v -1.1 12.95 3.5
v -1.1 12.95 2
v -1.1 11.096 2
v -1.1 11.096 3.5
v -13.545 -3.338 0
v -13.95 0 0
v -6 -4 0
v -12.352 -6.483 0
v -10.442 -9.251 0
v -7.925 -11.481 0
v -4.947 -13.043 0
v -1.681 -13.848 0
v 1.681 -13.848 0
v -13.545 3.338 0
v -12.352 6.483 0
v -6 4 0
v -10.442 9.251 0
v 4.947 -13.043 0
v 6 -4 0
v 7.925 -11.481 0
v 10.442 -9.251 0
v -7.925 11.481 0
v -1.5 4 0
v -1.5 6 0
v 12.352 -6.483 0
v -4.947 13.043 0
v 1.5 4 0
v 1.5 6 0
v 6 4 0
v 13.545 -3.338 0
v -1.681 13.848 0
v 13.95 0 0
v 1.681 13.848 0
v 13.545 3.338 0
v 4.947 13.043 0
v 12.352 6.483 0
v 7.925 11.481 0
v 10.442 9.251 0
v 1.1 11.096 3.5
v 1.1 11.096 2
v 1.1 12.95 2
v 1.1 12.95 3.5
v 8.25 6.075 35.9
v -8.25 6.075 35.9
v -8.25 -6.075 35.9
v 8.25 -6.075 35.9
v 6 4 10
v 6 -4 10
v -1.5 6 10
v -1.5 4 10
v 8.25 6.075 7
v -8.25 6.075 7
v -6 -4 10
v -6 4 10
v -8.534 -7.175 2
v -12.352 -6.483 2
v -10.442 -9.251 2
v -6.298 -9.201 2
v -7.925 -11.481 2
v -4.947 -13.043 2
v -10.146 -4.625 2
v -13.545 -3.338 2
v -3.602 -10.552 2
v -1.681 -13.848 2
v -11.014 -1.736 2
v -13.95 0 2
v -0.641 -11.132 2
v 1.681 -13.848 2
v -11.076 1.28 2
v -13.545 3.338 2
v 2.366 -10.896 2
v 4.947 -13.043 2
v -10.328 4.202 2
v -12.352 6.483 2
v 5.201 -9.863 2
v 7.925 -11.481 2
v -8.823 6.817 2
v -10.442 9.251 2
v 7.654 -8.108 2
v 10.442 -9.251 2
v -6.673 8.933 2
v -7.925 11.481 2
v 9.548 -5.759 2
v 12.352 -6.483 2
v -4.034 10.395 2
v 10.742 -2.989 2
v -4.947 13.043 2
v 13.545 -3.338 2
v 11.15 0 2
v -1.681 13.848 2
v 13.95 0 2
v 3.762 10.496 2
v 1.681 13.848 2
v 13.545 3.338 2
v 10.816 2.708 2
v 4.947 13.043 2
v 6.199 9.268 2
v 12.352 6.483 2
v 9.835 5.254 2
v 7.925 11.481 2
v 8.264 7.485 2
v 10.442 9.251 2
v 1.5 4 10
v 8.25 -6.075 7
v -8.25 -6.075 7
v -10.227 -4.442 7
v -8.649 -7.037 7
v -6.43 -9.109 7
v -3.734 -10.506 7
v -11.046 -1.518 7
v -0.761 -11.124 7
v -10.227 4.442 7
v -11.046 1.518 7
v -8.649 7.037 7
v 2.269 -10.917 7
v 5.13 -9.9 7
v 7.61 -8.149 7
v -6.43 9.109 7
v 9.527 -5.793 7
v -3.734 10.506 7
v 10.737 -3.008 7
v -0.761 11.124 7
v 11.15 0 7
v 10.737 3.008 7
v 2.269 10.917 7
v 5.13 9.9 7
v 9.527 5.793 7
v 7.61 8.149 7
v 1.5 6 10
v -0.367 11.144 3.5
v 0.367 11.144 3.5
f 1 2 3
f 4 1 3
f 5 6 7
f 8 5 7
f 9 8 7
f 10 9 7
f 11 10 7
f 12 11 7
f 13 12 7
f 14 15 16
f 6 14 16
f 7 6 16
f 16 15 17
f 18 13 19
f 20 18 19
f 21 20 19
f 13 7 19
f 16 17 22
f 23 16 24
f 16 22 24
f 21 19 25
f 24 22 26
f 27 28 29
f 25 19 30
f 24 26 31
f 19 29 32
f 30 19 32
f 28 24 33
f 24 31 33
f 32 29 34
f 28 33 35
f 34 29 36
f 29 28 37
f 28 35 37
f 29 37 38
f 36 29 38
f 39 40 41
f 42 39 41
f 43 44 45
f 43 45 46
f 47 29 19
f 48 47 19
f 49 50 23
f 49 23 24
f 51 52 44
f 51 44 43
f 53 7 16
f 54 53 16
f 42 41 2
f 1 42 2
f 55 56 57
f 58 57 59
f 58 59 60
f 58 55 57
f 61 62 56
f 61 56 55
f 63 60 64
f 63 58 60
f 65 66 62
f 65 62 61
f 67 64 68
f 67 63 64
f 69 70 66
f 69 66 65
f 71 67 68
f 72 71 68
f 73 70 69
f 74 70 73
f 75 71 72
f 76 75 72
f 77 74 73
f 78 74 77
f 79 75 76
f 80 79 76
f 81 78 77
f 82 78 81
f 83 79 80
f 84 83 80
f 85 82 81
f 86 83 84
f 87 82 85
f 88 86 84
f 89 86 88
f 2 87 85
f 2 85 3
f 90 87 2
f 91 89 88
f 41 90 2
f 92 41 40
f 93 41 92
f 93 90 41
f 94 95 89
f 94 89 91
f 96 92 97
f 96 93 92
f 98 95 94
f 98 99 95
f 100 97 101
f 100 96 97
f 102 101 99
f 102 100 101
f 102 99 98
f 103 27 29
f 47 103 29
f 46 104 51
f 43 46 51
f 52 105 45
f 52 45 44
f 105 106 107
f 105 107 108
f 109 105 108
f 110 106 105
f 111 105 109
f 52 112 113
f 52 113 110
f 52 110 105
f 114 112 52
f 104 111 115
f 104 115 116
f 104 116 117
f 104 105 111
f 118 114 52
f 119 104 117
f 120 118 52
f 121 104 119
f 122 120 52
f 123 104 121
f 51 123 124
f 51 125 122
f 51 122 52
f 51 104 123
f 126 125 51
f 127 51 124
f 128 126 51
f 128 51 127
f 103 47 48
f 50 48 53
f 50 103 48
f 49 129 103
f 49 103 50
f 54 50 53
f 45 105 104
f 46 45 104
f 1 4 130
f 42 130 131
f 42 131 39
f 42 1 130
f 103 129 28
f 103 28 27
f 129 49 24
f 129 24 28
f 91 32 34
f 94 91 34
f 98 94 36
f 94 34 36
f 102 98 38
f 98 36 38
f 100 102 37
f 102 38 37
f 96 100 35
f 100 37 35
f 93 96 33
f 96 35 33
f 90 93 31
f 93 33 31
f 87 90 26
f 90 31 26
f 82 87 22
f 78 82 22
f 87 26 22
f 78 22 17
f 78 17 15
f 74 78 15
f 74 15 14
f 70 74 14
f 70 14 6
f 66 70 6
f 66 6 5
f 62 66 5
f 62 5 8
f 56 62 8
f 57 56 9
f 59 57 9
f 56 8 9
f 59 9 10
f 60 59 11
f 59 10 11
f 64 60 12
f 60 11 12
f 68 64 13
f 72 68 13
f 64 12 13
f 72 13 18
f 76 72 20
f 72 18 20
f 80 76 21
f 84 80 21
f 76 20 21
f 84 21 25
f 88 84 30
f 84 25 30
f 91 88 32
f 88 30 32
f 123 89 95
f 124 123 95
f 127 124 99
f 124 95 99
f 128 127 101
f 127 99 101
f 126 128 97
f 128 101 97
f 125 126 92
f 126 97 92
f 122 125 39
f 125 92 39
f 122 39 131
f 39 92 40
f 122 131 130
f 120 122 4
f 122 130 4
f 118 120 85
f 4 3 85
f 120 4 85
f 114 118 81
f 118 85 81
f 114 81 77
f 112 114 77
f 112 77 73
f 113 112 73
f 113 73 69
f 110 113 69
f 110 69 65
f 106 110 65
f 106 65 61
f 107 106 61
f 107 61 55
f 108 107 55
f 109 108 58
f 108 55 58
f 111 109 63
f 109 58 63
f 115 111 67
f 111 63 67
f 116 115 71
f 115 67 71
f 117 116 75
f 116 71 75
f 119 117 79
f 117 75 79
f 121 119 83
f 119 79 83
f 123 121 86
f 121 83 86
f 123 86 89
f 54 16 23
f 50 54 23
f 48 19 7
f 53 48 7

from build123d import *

# Parameters (mm, degrees)
ESQUISSE1_R             = 13.95
BOSS_EXTRU_1_DEPTH      = 2
ESQUISSE2_R             = 11.15
BOSS_EXTRU_2_DEPTH      = 5
BOSS_EXTRU_3_DEPTH      = 1.5
ESQUISSE4_W             = 16.5
ESQUISSE4_H             = 12.15
BOSS_EXTRU_4_DEPTH      = 28.9
ENL_V_MAT_EXTRU_1_DEPTH = 10


with BuildPart() as part:
    # Esquisse1 → Boss.-Extru.1 (new body)
    with BuildSketch(Plane.XY):
        Circle(ESQUISSE1_R)
    extrude(amount=BOSS_EXTRU_1_DEPTH)

    # Esquisse2 → Boss.-Extru.2 (add)
    with BuildSketch(Plane.XY.offset(2)):
        Circle(ESQUISSE2_R)
    extrude(amount=BOSS_EXTRU_2_DEPTH)

    # Esquisse3 → Boss.-Extru.3 (add)
    with BuildSketch(Plane.XY.offset(2)):
        with BuildLine():
            ThreePointArc((-1.1, 11.095607239), (0, 11.15), (1.1, 11.095607239))
            Line((1.1, 11.095607239), (1.1, 12.95))
            Line((1.1, 12.95), (-1.1, 12.95))
            Line((-1.1, 12.95), (-1.1, 11.095607239))
        make_face()
    extrude(amount=BOSS_EXTRU_3_DEPTH)

    # Esquisse4 → Boss.-Extru.4 (add)
    with BuildSketch(Plane.XY.offset(7)):
        Rectangle(ESQUISSE4_W, ESQUISSE4_H)
    extrude(amount=BOSS_EXTRU_4_DEPTH)

    # Esquisse6 → Enlèv. mat.-Extru.1 (cut)
    with BuildSketch(Plane(origin=(0, 0, 0), x_dir=(-1, 0, 0), z_dir=(0, 0, -1))):
        Polygon((6, 4), (1.5, 4), (1.5, 6), (-1.5, 6), (-1.5, 4), (-6, 4), (-6, -4), (6, -4), align=None)
    extrude(amount=-ENL_V_MAT_EXTRU_1_DEPTH, mode=Mode.SUBTRACT)


solid = part.part
